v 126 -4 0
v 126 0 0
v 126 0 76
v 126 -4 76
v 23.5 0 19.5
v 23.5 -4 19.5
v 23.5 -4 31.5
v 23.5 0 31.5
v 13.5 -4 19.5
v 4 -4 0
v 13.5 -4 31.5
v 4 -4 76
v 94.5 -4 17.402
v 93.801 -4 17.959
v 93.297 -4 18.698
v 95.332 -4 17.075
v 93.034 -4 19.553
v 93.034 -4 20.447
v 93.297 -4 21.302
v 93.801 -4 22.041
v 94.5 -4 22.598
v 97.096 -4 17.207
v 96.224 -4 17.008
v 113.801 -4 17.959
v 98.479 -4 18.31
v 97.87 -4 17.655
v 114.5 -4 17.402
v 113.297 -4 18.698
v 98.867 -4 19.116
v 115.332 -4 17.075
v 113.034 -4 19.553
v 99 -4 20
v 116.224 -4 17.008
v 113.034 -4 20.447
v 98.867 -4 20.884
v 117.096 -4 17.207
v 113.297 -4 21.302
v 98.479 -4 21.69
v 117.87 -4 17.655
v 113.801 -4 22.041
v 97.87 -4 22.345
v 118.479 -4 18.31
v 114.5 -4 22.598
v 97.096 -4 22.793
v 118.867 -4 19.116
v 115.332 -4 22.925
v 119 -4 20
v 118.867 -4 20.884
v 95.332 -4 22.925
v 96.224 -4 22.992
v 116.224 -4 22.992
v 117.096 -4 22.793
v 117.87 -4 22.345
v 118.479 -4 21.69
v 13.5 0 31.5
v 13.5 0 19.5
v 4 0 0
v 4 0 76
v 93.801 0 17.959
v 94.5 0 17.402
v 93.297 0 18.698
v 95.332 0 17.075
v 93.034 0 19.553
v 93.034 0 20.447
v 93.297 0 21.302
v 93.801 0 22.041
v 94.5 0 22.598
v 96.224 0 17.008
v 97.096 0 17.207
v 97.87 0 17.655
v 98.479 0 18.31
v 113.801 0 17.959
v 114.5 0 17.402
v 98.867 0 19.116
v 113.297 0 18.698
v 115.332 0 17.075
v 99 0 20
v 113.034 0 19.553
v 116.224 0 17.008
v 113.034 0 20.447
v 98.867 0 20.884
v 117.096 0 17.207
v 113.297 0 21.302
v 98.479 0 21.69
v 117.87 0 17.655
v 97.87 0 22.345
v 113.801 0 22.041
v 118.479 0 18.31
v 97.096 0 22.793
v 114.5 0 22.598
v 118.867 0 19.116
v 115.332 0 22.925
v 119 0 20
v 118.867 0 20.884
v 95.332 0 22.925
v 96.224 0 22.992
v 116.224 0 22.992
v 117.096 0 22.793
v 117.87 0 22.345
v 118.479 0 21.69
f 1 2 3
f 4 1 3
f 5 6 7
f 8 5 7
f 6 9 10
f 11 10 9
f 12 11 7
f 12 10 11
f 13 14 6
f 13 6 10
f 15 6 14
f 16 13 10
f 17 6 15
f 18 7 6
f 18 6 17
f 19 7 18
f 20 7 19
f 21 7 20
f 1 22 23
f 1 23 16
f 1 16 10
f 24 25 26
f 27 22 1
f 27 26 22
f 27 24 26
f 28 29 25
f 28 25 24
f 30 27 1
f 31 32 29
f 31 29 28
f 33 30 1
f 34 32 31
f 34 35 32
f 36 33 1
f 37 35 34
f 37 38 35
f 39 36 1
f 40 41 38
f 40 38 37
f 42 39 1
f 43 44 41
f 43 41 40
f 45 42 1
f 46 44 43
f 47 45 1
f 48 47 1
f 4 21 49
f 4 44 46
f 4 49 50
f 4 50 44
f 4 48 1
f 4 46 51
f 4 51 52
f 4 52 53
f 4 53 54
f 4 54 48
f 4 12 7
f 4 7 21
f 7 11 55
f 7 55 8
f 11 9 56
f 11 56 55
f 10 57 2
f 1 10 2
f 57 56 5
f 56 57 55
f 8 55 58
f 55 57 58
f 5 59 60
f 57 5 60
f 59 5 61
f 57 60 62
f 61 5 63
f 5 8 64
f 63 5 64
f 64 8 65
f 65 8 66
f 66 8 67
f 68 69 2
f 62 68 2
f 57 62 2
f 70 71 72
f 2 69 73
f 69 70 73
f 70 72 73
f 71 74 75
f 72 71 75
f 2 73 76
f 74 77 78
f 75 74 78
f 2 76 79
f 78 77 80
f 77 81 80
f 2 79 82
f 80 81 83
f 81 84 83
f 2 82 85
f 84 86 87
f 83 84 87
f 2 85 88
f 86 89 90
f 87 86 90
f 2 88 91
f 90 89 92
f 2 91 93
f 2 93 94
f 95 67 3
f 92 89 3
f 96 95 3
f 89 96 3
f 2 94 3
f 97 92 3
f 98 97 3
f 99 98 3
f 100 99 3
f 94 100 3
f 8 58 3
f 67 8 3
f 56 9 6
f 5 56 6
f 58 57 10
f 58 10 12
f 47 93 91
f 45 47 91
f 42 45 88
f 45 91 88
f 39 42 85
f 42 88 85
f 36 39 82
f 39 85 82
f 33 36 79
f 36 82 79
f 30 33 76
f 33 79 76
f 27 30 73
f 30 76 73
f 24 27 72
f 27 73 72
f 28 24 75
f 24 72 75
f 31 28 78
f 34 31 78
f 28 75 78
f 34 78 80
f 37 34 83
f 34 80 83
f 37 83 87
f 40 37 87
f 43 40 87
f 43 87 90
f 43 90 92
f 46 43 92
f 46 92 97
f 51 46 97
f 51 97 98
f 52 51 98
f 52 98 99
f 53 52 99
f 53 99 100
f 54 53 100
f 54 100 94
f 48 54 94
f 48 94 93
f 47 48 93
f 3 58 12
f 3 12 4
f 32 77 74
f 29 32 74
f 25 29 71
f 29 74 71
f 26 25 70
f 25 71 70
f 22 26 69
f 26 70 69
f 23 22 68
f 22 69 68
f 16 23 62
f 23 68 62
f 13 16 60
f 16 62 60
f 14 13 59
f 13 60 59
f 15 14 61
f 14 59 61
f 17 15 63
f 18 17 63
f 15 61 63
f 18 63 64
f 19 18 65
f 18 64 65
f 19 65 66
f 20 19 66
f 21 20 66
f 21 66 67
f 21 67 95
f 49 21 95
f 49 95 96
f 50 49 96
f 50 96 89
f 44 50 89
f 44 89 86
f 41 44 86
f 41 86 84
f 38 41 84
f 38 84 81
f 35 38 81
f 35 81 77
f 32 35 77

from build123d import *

# Parameters (mm, degrees)
SKETCH002_W   = 122
SKETCH002_H   = 76
PAD001_DEPTH  = 4
SKETCH003_W   = 10
SKETCH003_H   = 12
POCKET_DEPTH  = 4.001
SKETCH008_R   = 3
HOLE002_DEPTH = 4.001


with BuildPart() as part:
    # Sketch002 → Pad001 (new body)
    with BuildSketch(Plane.XZ):
        with Locations((65, 38)):
            Rectangle(SKETCH002_W, SKETCH002_H)
    extrude(amount=PAD001_DEPTH)

    # Sketch003 (on Face6 of Pad001) → Pocket (cut, through all)
    with BuildSketch(Plane.XZ.offset(4)):
        with Locations((18.5, 25.5)):
            Rectangle(SKETCH003_W, SKETCH003_H)
    extrude(amount=-POCKET_DEPTH, mode=Mode.SUBTRACT)

    # Sketch008 (on Face4 of Pocket) → Hole002 (cut, through all)
    with BuildSketch(Plane(origin=(0, 0, 0), x_dir=(1, 0, 0), z_dir=(0, 1, 0))):
        with Locations((116, -20)):
            Circle(SKETCH008_R)
        with Locations((96, -20)):
            Circle(SKETCH008_R)
    extrude(amount=-HOLE002_DEPTH, mode=Mode.SUBTRACT)


solid = part.part
